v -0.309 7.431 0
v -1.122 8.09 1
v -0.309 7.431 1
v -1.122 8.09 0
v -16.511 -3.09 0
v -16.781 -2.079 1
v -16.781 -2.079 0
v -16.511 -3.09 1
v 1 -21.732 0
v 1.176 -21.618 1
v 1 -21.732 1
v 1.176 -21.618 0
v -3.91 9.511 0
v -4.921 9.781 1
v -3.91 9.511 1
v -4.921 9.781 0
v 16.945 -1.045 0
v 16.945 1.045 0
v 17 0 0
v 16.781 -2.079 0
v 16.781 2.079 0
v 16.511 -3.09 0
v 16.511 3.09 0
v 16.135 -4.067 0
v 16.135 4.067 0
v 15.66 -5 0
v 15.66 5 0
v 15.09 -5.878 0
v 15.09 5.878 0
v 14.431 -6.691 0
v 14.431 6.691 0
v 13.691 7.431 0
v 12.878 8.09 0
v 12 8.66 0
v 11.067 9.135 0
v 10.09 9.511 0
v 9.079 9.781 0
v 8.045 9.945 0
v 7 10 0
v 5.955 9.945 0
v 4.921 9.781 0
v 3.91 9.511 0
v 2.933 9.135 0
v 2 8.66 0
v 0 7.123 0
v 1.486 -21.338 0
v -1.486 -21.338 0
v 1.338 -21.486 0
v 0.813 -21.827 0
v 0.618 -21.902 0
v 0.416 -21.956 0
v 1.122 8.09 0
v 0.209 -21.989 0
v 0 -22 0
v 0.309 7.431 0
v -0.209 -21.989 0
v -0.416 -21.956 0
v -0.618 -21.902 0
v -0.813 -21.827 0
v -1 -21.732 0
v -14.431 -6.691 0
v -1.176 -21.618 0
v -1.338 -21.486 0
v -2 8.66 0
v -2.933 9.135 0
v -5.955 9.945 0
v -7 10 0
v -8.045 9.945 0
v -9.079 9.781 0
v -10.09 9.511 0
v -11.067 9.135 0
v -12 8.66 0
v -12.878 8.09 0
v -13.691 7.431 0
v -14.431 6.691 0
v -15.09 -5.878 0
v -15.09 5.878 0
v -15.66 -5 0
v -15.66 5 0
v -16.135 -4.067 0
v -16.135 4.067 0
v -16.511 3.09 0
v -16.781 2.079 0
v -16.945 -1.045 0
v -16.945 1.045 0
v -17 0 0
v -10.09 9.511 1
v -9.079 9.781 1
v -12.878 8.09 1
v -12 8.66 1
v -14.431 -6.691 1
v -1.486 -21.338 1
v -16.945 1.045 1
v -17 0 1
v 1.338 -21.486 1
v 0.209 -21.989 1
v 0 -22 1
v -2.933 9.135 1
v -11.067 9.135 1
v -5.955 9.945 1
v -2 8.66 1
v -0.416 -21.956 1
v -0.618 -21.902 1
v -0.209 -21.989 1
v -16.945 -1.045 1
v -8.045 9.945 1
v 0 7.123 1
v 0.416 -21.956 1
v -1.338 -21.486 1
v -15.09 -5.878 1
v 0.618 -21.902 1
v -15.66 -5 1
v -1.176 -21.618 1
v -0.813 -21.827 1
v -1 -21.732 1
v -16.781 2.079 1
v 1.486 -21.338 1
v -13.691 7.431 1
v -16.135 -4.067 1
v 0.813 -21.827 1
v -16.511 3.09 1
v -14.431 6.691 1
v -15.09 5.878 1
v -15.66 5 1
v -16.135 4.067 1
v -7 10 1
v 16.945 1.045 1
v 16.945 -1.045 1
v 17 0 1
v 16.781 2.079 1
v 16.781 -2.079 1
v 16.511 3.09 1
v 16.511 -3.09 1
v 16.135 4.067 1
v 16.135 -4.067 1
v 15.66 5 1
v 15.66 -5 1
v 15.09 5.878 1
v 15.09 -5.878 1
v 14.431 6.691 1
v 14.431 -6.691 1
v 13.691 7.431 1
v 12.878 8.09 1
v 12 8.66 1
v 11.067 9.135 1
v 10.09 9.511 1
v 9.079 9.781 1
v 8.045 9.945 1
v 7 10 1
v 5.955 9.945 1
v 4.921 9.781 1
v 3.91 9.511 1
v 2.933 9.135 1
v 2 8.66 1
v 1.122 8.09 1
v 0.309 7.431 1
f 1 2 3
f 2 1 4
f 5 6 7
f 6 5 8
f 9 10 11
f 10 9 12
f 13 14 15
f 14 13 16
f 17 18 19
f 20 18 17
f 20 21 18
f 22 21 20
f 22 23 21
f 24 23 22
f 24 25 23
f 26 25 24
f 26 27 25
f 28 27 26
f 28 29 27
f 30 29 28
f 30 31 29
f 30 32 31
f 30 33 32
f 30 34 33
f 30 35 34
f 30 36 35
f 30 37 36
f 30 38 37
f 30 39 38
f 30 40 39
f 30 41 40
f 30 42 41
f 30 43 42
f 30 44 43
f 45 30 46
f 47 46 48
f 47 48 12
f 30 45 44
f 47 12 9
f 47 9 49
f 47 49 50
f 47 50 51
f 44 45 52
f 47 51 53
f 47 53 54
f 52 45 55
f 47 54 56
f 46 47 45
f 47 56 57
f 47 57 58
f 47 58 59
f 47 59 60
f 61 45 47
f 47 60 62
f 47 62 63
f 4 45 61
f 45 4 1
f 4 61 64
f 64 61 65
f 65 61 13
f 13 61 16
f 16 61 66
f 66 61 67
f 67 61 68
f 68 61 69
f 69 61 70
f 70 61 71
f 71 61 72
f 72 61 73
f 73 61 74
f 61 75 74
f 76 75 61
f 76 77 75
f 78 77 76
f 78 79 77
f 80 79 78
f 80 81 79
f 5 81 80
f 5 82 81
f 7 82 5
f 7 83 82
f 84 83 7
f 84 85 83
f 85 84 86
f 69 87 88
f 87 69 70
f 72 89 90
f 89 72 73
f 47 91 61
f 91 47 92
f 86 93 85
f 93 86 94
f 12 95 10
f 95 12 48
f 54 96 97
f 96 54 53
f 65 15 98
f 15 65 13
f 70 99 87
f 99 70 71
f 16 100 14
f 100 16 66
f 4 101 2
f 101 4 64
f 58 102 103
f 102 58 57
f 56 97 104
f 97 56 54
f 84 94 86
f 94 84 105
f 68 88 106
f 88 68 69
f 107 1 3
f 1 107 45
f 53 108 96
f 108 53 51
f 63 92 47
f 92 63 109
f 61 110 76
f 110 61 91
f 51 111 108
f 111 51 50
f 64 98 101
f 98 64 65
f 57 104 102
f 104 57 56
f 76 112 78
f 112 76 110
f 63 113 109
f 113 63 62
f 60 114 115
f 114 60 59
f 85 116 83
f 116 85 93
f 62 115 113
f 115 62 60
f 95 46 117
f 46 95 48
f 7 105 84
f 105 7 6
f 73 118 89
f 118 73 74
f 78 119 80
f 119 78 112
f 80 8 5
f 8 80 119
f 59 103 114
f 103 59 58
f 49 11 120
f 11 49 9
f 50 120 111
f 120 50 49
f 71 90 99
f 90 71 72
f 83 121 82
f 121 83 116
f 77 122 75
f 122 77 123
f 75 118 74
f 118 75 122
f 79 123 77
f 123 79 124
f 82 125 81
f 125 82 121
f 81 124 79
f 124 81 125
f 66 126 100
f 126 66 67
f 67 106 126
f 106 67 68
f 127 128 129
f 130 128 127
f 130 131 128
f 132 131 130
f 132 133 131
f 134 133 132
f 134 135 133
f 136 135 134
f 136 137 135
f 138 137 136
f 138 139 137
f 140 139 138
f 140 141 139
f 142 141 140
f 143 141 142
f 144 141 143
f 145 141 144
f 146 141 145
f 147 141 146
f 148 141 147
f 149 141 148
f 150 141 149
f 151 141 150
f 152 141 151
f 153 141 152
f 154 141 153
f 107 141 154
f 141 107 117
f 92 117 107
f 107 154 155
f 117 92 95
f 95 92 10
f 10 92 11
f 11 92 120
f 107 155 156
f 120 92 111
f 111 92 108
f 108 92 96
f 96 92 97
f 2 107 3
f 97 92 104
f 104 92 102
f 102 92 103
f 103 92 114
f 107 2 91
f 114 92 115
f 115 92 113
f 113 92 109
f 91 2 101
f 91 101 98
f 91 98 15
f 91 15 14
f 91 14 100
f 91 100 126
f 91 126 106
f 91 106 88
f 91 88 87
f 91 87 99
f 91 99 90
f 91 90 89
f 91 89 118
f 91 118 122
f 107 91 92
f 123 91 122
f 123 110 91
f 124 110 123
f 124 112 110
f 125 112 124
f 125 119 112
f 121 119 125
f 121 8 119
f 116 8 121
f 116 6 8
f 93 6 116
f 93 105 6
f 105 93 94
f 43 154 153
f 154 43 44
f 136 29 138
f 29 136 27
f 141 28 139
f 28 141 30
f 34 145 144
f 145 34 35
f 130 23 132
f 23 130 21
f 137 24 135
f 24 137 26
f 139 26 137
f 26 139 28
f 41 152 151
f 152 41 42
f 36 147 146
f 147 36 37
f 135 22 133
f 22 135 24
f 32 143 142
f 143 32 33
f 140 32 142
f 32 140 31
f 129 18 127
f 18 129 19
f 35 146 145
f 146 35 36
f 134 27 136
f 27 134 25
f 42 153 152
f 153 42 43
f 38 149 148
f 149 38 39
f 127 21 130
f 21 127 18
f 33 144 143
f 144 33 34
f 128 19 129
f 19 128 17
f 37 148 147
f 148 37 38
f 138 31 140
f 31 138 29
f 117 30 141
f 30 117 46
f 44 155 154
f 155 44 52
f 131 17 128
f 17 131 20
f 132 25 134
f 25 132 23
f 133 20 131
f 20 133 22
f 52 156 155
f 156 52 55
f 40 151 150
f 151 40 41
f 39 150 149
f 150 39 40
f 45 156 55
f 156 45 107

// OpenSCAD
$fn=60;
union() {
	hull() {
		translate([-7, 0]) cylinder(h=1, r=10);
		translate([0, -20]) cylinder(h=1, r=2);
	}
	hull() {
		translate([7, 0]) cylinder(h=1, r=10);
		translate([0, -20]) cylinder(h=1, r=2);
	}
}
